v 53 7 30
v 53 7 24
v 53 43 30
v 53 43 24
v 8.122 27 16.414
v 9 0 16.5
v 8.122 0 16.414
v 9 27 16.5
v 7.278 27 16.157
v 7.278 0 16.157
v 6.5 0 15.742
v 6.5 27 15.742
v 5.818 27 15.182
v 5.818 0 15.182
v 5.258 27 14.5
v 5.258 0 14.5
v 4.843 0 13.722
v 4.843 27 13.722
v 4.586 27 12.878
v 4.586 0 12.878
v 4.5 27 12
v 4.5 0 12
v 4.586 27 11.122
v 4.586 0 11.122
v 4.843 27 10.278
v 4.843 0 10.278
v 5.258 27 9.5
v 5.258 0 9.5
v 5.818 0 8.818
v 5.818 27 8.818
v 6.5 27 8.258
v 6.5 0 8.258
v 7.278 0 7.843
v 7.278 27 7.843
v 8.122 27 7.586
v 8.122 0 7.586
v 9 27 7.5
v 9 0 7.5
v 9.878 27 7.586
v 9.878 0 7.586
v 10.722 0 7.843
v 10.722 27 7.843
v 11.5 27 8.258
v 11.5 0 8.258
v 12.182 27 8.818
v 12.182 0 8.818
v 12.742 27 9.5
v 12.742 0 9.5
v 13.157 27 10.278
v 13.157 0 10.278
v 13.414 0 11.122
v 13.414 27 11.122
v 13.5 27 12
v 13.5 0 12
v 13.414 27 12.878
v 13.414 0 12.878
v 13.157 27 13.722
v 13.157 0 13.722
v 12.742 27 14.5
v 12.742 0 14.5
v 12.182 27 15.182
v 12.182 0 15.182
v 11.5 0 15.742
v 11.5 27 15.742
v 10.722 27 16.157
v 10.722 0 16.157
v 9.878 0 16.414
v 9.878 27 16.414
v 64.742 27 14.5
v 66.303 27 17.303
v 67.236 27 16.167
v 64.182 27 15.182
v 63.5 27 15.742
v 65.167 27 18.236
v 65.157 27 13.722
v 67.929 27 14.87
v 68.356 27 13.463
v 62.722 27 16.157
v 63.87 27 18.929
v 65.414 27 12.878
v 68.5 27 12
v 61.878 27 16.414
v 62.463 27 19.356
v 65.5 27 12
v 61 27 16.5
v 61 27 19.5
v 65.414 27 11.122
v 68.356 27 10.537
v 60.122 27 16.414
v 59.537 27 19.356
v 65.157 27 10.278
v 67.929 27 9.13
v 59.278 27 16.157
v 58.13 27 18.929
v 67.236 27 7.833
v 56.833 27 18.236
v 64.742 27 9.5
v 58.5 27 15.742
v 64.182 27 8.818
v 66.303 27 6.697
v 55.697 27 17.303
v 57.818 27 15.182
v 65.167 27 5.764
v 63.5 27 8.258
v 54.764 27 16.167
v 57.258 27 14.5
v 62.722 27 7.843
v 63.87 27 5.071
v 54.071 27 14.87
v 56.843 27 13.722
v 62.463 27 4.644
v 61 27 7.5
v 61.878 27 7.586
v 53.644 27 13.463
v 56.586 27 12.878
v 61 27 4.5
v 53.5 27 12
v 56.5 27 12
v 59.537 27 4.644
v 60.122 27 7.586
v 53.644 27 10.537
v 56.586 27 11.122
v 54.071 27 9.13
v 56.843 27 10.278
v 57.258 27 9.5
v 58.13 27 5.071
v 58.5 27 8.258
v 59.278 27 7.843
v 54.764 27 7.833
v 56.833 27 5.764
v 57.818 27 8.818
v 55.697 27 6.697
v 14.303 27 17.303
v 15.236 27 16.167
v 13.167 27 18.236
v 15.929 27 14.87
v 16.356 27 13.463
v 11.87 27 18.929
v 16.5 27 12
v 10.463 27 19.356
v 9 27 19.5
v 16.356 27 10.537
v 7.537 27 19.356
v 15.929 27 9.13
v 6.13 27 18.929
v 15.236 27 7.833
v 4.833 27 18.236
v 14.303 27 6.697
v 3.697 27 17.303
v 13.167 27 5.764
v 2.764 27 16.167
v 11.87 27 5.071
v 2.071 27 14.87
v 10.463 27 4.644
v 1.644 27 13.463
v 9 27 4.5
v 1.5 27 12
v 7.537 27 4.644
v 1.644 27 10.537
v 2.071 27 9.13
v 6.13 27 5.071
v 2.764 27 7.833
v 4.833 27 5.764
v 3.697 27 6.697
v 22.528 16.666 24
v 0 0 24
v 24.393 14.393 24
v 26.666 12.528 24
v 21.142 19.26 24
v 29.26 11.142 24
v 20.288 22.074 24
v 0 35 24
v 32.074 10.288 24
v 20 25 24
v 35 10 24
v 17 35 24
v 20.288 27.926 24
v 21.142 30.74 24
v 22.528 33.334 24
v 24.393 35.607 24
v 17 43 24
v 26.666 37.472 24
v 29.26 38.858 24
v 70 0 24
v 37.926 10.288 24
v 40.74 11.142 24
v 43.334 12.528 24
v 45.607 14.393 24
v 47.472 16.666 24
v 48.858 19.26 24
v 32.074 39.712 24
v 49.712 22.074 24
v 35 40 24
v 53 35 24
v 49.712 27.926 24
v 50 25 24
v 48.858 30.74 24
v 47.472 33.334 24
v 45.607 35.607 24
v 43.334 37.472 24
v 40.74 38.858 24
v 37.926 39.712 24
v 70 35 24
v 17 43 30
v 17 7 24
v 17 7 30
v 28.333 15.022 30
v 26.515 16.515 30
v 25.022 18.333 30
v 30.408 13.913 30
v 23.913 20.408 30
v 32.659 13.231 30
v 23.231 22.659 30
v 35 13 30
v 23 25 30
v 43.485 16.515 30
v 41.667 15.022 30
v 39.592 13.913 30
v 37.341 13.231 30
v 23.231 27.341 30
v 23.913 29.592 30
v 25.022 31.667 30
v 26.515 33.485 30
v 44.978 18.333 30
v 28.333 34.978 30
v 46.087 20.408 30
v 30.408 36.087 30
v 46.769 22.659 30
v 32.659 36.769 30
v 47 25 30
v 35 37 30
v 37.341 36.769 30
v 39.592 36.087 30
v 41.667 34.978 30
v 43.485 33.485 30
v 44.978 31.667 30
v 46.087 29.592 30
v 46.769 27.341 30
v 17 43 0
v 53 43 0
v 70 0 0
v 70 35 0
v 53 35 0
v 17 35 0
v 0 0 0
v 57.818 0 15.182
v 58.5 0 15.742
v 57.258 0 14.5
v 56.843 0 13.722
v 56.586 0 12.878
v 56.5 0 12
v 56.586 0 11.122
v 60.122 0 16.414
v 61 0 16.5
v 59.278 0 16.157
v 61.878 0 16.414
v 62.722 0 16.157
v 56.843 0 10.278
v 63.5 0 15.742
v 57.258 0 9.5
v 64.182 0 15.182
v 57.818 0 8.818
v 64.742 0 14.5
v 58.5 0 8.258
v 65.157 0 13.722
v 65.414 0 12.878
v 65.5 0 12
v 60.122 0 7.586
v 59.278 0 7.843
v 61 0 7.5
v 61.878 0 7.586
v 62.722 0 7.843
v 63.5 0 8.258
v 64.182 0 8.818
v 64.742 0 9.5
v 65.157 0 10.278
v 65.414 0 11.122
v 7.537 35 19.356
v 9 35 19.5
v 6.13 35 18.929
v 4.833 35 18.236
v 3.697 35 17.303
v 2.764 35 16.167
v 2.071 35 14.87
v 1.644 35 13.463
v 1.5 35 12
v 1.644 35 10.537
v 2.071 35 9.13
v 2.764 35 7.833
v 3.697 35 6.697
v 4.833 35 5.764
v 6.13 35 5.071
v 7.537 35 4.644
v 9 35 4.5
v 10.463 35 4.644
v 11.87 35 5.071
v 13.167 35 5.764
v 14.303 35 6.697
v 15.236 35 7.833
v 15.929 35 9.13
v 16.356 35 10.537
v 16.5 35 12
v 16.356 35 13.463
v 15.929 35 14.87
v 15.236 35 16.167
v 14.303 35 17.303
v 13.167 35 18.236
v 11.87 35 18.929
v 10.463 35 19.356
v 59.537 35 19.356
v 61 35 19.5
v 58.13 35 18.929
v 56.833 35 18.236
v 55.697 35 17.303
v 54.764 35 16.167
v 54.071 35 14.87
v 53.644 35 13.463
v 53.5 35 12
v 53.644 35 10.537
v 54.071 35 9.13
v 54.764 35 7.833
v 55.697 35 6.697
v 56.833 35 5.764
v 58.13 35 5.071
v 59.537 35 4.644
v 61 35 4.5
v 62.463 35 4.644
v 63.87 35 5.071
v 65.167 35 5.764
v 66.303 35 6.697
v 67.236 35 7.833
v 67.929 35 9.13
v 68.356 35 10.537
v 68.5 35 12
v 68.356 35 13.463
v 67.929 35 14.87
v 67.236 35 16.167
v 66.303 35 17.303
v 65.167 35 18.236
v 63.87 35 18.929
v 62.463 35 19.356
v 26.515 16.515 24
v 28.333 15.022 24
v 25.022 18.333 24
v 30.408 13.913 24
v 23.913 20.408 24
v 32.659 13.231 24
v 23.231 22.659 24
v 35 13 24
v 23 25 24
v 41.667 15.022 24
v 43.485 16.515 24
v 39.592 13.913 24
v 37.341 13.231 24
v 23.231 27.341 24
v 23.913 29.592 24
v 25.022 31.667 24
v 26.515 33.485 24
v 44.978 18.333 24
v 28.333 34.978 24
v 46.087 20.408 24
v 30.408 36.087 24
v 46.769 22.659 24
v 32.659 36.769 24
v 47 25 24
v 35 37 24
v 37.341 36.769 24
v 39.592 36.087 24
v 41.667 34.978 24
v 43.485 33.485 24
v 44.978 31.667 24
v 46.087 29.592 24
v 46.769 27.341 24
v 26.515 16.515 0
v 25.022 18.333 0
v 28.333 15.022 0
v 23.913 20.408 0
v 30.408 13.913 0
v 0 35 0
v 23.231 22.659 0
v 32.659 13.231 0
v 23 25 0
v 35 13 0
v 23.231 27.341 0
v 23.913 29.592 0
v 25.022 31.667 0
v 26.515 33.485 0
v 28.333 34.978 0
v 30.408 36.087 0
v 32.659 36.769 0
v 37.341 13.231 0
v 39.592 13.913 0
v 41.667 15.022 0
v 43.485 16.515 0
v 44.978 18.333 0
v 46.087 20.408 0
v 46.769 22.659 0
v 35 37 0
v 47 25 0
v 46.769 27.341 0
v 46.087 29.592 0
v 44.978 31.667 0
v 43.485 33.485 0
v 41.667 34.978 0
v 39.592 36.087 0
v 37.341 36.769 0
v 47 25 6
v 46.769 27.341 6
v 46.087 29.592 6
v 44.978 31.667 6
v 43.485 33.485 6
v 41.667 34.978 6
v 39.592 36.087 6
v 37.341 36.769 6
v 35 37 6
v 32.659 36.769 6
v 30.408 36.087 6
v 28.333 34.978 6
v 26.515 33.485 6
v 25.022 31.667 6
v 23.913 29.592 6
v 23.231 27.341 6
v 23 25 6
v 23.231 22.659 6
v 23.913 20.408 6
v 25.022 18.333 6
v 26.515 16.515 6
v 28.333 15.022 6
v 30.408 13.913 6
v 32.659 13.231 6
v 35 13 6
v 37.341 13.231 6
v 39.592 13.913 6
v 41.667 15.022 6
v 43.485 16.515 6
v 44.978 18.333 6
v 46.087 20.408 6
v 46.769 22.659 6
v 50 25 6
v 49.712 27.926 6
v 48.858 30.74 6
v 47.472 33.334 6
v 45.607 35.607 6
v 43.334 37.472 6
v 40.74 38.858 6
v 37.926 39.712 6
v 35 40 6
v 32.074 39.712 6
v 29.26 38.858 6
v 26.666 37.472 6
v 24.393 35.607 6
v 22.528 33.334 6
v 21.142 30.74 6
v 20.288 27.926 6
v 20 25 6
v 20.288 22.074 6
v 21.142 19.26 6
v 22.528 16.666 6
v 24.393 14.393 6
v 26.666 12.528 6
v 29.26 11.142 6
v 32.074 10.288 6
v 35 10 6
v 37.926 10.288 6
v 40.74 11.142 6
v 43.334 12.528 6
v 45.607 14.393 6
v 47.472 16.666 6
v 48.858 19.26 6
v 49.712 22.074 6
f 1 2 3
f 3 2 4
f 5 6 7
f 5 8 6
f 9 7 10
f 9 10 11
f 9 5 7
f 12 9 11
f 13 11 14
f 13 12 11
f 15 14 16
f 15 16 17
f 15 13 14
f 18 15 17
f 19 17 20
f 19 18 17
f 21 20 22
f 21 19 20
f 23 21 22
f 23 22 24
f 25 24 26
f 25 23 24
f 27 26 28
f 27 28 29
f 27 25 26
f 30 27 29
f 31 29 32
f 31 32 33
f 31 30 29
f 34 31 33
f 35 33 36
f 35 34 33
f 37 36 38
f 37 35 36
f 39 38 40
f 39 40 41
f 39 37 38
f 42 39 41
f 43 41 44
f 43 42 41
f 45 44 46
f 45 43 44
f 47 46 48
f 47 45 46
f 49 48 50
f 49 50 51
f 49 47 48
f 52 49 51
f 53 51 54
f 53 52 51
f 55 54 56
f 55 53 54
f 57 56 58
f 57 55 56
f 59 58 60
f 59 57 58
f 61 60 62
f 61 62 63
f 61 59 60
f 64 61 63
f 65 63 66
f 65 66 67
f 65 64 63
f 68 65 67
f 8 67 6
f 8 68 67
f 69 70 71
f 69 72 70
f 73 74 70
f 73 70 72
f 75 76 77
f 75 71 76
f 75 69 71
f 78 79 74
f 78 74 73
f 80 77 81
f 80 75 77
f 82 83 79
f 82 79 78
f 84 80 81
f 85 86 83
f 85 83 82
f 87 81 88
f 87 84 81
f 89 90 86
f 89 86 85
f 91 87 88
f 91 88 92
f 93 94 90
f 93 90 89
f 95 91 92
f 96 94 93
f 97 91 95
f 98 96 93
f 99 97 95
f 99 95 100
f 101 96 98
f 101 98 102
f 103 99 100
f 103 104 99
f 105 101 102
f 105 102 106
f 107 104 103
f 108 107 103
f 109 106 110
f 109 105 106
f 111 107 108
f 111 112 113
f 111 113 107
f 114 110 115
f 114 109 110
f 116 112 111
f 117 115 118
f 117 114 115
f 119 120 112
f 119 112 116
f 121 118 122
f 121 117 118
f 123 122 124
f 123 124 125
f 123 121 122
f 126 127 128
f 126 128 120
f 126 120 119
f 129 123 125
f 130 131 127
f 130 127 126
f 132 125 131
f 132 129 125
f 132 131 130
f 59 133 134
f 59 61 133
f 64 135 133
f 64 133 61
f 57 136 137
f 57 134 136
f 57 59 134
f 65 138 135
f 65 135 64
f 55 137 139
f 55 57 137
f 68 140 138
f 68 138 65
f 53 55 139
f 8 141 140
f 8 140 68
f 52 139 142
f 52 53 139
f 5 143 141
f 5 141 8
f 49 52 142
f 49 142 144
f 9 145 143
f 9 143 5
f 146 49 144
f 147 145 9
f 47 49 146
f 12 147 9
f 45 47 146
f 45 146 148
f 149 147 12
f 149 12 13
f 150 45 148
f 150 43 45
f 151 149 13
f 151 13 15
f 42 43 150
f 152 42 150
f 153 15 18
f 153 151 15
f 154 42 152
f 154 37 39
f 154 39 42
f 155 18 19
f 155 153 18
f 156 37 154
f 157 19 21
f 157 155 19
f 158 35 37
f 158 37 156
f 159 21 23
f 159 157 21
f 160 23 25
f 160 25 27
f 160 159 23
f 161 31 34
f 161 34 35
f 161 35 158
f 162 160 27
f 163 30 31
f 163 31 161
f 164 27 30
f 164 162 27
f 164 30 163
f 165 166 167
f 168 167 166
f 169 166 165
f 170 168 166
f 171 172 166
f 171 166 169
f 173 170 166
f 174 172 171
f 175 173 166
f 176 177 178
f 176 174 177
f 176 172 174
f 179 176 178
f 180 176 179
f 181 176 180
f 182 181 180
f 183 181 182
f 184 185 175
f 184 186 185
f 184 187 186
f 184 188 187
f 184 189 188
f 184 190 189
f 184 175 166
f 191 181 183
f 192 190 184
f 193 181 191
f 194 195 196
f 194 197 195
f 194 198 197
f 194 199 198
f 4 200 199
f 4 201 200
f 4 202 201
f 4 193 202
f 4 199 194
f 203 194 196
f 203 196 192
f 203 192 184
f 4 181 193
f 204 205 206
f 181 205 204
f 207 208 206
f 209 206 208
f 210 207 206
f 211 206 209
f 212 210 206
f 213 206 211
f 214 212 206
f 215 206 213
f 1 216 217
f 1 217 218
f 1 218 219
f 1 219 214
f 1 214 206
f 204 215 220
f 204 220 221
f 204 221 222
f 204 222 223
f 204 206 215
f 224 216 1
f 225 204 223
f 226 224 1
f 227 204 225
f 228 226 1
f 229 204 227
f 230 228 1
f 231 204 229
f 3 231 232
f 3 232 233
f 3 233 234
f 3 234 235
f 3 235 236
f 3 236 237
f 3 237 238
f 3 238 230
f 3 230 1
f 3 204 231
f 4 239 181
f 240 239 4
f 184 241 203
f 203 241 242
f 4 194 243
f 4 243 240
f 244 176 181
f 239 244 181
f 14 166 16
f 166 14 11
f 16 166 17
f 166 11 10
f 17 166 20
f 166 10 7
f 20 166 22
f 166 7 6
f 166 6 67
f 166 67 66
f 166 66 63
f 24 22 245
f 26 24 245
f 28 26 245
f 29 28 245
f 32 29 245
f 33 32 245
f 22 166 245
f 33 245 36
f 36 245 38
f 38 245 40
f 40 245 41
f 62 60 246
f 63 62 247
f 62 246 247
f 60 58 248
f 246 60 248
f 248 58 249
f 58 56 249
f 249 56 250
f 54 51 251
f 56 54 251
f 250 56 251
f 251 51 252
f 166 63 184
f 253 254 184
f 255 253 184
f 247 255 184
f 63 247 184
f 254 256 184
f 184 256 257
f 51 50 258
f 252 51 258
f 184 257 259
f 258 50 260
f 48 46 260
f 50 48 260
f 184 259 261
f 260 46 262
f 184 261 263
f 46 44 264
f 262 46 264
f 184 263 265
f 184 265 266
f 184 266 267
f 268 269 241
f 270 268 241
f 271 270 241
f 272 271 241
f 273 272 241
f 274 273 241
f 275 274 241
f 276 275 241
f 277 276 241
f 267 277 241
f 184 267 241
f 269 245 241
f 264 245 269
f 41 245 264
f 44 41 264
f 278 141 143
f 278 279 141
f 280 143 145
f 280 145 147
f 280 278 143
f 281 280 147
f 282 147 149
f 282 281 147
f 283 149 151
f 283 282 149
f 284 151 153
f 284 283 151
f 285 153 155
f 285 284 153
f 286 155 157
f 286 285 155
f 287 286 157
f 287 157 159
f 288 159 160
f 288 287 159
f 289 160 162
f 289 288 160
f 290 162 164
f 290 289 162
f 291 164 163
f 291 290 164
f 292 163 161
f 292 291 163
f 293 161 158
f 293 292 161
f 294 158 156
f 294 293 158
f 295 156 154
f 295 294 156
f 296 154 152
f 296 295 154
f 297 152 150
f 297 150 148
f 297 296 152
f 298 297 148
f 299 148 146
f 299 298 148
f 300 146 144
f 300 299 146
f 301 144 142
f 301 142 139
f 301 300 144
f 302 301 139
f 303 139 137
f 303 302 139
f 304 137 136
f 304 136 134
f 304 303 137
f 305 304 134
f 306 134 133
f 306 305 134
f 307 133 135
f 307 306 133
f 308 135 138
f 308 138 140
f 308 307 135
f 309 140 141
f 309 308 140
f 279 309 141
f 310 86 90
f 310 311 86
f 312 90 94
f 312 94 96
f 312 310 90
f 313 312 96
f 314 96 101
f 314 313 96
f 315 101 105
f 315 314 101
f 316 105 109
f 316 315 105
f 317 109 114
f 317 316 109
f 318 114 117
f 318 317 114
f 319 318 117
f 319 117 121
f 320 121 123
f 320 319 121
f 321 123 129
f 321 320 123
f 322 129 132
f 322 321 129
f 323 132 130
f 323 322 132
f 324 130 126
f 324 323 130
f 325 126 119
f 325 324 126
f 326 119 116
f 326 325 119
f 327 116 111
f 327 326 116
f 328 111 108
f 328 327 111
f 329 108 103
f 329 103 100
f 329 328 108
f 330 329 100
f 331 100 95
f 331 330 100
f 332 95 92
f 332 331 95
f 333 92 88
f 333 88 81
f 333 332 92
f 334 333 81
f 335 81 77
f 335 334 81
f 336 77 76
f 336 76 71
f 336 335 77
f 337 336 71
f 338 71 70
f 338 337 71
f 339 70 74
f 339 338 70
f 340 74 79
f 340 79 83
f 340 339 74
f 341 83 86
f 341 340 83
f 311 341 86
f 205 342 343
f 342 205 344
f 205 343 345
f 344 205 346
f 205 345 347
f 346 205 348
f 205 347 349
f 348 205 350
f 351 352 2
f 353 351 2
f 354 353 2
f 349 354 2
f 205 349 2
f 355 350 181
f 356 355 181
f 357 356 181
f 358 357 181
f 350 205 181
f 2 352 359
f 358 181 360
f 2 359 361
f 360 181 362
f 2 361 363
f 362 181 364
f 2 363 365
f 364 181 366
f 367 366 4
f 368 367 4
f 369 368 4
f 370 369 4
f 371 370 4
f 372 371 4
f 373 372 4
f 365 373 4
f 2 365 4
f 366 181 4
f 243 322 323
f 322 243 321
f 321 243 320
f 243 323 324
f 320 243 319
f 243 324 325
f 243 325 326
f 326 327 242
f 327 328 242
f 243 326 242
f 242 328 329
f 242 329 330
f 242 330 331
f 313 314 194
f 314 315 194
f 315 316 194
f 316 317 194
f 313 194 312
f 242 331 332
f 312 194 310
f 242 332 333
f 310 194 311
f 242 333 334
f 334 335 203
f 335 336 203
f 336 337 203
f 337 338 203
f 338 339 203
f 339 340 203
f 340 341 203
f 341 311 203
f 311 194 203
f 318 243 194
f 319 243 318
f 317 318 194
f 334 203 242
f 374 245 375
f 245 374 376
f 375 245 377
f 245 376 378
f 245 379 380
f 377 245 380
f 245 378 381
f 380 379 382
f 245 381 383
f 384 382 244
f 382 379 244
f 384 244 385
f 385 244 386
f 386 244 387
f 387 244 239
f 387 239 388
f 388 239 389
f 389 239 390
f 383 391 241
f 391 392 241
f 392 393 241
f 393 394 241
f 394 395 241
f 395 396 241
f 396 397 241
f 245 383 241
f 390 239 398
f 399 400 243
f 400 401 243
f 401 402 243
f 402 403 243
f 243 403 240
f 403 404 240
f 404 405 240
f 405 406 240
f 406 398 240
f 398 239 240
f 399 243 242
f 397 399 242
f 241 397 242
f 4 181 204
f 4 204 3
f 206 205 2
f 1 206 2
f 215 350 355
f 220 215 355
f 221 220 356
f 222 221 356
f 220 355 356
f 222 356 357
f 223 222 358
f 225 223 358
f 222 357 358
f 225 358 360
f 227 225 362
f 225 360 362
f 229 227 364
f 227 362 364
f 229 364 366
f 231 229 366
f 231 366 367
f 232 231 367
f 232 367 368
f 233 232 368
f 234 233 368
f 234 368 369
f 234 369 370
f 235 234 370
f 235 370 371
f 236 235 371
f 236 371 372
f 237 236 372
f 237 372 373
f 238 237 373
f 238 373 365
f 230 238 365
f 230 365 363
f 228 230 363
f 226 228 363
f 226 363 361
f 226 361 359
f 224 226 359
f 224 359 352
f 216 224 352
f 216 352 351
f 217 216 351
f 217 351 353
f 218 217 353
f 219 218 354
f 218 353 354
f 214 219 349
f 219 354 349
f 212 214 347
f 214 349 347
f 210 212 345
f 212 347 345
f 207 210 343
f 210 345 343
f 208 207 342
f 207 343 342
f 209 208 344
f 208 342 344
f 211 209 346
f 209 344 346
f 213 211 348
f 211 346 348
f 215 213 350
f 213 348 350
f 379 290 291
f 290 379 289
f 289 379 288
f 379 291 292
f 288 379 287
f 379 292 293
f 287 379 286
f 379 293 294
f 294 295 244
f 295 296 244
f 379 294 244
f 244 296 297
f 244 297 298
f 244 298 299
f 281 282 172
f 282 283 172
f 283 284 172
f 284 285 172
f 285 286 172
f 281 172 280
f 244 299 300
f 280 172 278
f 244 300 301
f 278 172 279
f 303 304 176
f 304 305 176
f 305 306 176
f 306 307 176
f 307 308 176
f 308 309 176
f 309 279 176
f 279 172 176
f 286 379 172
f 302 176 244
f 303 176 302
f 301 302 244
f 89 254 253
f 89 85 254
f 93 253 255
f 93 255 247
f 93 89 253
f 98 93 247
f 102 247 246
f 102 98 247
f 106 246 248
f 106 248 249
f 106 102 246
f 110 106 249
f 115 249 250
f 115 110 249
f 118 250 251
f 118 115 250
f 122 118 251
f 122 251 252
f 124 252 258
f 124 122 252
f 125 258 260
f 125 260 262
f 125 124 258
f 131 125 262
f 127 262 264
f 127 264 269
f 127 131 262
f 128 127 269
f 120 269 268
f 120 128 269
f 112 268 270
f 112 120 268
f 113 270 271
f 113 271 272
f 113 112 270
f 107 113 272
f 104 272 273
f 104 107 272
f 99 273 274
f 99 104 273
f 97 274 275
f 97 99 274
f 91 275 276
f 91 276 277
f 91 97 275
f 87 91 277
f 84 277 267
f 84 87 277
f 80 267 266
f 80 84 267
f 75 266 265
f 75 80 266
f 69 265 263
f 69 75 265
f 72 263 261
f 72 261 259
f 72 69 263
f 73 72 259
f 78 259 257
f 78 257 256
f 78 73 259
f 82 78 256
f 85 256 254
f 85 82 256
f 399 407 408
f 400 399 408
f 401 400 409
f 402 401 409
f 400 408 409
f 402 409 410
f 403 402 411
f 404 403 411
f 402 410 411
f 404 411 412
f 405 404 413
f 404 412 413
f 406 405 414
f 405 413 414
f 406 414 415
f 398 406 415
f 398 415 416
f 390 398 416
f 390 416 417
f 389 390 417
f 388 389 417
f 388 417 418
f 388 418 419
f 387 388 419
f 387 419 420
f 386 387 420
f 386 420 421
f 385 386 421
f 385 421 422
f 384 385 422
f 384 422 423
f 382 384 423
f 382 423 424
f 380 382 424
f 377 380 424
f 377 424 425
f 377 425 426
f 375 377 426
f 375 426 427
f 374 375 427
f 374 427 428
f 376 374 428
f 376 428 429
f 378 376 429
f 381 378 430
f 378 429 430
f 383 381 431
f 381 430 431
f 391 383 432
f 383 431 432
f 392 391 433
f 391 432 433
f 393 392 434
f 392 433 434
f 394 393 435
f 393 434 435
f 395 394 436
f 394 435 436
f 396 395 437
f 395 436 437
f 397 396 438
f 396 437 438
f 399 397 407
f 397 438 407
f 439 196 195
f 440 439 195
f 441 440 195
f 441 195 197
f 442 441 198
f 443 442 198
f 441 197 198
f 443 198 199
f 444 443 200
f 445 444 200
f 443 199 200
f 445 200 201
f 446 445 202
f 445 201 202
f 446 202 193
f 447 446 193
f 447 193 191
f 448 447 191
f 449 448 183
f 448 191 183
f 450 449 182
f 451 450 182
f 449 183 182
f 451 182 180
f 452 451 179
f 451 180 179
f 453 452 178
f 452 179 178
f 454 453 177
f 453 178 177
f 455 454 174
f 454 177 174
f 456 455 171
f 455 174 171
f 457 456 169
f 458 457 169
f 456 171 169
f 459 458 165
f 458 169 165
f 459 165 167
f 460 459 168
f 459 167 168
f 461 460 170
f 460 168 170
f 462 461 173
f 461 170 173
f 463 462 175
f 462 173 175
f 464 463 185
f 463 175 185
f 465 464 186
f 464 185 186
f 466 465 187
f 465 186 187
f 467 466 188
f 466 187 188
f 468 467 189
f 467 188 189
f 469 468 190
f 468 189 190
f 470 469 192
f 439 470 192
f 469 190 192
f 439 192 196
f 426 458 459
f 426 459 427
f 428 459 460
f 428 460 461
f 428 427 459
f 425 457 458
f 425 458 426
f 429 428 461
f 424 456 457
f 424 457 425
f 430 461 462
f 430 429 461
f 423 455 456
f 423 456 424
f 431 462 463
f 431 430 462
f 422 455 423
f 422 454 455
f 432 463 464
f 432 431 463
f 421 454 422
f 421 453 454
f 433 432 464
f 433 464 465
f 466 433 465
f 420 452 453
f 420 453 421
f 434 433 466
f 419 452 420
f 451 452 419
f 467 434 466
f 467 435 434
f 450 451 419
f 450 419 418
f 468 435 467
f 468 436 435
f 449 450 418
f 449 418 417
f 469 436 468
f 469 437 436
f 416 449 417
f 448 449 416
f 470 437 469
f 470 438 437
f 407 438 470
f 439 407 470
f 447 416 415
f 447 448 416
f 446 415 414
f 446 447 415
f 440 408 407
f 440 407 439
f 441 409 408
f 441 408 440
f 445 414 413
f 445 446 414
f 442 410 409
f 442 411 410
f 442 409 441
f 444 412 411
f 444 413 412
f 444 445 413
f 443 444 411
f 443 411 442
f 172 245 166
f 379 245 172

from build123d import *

# Parameters (mm, degrees)
SKETCH_1_W                  = 70
SKETCH_1_H                  = 43
EXTRUDE_1_DEPTH             = 24
SKETCH_2_W                  = 17
SKETCH_2_H                  = 8
CUT_EXTRUDE_1_DEPTH         = 86.586213843
SKETCH_3_R                  = 15
CUT_EXTRUDE_2_DEPTH         = 18
SKETCH_4_R                  = 12
CUT_EXTRUDE_3_DEPTH         = 85.1011296
SKETCH_5_W                  = 36
SKETCH_5_H                  = 36
EXTRUDE_2_DEPTH             = 6
SKETCH_6_R                  = 12
CUT_EXTRUDE_4_DEPTH         = 86.586213843
HOLE_WIZARD_M8_1_AT_2_COUNT = 2
HOLE_WIZARD_M8_1_AT_2_PITCH = 52


with BuildPart() as part:
    # 草图1 → 凸台-拉伸1 (new body)
    with BuildSketch(Plane.XY):
        with Locations((35, 21.5)):
            Rectangle(SKETCH_1_W, SKETCH_1_H)
    extrude(amount=EXTRUDE_1_DEPTH)

    # 草图2 → 切除-拉伸1 (cut, through all)
    with BuildSketch(Plane.XY.offset(24)):
        with Locations((8.5, 39)):
            Rectangle(SKETCH_2_W, SKETCH_2_H)
        with Locations((61.5, 39)):
            Rectangle(SKETCH_2_W, SKETCH_2_H)
    extrude(amount=-CUT_EXTRUDE_1_DEPTH, mode=Mode.SUBTRACT)

    # 草图3 → 切除-拉伸2 (cut)
    with BuildSketch(Plane.XY.offset(24)):
        with Locations((35, 25)):
            Circle(SKETCH_3_R)
    extrude(amount=-CUT_EXTRUDE_2_DEPTH, mode=Mode.SUBTRACT)

    # 草图4 → 切除-拉伸3 (cut, through all)
    with BuildSketch(Plane.XY.offset(6)):
        with Locations((35, 25)):
            Circle(SKETCH_4_R)
    extrude(amount=-CUT_EXTRUDE_3_DEPTH, mode=Mode.SUBTRACT)

    # 草图7 → M8 六角凹头螺钉的柱形沉头孔1 (revolve, cut)
    with BuildSketch(Plane(origin=(61, 35, 12), x_dir=(0, 0, 1), z_dir=(1, 0, 0))):
        Polygon((0, 0), (0, 35), (4.5, 35), (4.5, 8), (7.5, 8), (7.5, 0), align=None)
    hole_wizard_m8_1 = revolve(axis=Axis((61, 41.35, 12), (0, -1, 0)), mode=Mode.SUBTRACT)

    # M8 六角凹头螺钉的柱形沉头孔1 at 2: M8 六角凹头螺钉的柱形沉头孔1 ×2
    with Locations(*[(-i * HOLE_WIZARD_M8_1_AT_2_PITCH, 0, 0) for i in range(1, HOLE_WIZARD_M8_1_AT_2_COUNT)]):
        add(hole_wizard_m8_1, mode=Mode.SUBTRACT)


with BuildPart() as body_2:
    # 草图5 → 凸台-拉伸2 (new body)
    with BuildSketch(Plane.XY.offset(24)):
        with Locations((35, 25)):
            Rectangle(SKETCH_5_W, SKETCH_5_H)
    extrude(amount=EXTRUDE_2_DEPTH)

    # 草图6 → 切除-拉伸4 (cut, through all)
    with BuildSketch(Plane(origin=(0, 0, 24), x_dir=(-1, 0, 0), z_dir=(0, 0, -1))):
        with Locations((-35, 25)):
            Circle(SKETCH_6_R)
    extrude(amount=-CUT_EXTRUDE_4_DEPTH, mode=Mode.SUBTRACT)


solid = Compound([part.part, body_2.part])
